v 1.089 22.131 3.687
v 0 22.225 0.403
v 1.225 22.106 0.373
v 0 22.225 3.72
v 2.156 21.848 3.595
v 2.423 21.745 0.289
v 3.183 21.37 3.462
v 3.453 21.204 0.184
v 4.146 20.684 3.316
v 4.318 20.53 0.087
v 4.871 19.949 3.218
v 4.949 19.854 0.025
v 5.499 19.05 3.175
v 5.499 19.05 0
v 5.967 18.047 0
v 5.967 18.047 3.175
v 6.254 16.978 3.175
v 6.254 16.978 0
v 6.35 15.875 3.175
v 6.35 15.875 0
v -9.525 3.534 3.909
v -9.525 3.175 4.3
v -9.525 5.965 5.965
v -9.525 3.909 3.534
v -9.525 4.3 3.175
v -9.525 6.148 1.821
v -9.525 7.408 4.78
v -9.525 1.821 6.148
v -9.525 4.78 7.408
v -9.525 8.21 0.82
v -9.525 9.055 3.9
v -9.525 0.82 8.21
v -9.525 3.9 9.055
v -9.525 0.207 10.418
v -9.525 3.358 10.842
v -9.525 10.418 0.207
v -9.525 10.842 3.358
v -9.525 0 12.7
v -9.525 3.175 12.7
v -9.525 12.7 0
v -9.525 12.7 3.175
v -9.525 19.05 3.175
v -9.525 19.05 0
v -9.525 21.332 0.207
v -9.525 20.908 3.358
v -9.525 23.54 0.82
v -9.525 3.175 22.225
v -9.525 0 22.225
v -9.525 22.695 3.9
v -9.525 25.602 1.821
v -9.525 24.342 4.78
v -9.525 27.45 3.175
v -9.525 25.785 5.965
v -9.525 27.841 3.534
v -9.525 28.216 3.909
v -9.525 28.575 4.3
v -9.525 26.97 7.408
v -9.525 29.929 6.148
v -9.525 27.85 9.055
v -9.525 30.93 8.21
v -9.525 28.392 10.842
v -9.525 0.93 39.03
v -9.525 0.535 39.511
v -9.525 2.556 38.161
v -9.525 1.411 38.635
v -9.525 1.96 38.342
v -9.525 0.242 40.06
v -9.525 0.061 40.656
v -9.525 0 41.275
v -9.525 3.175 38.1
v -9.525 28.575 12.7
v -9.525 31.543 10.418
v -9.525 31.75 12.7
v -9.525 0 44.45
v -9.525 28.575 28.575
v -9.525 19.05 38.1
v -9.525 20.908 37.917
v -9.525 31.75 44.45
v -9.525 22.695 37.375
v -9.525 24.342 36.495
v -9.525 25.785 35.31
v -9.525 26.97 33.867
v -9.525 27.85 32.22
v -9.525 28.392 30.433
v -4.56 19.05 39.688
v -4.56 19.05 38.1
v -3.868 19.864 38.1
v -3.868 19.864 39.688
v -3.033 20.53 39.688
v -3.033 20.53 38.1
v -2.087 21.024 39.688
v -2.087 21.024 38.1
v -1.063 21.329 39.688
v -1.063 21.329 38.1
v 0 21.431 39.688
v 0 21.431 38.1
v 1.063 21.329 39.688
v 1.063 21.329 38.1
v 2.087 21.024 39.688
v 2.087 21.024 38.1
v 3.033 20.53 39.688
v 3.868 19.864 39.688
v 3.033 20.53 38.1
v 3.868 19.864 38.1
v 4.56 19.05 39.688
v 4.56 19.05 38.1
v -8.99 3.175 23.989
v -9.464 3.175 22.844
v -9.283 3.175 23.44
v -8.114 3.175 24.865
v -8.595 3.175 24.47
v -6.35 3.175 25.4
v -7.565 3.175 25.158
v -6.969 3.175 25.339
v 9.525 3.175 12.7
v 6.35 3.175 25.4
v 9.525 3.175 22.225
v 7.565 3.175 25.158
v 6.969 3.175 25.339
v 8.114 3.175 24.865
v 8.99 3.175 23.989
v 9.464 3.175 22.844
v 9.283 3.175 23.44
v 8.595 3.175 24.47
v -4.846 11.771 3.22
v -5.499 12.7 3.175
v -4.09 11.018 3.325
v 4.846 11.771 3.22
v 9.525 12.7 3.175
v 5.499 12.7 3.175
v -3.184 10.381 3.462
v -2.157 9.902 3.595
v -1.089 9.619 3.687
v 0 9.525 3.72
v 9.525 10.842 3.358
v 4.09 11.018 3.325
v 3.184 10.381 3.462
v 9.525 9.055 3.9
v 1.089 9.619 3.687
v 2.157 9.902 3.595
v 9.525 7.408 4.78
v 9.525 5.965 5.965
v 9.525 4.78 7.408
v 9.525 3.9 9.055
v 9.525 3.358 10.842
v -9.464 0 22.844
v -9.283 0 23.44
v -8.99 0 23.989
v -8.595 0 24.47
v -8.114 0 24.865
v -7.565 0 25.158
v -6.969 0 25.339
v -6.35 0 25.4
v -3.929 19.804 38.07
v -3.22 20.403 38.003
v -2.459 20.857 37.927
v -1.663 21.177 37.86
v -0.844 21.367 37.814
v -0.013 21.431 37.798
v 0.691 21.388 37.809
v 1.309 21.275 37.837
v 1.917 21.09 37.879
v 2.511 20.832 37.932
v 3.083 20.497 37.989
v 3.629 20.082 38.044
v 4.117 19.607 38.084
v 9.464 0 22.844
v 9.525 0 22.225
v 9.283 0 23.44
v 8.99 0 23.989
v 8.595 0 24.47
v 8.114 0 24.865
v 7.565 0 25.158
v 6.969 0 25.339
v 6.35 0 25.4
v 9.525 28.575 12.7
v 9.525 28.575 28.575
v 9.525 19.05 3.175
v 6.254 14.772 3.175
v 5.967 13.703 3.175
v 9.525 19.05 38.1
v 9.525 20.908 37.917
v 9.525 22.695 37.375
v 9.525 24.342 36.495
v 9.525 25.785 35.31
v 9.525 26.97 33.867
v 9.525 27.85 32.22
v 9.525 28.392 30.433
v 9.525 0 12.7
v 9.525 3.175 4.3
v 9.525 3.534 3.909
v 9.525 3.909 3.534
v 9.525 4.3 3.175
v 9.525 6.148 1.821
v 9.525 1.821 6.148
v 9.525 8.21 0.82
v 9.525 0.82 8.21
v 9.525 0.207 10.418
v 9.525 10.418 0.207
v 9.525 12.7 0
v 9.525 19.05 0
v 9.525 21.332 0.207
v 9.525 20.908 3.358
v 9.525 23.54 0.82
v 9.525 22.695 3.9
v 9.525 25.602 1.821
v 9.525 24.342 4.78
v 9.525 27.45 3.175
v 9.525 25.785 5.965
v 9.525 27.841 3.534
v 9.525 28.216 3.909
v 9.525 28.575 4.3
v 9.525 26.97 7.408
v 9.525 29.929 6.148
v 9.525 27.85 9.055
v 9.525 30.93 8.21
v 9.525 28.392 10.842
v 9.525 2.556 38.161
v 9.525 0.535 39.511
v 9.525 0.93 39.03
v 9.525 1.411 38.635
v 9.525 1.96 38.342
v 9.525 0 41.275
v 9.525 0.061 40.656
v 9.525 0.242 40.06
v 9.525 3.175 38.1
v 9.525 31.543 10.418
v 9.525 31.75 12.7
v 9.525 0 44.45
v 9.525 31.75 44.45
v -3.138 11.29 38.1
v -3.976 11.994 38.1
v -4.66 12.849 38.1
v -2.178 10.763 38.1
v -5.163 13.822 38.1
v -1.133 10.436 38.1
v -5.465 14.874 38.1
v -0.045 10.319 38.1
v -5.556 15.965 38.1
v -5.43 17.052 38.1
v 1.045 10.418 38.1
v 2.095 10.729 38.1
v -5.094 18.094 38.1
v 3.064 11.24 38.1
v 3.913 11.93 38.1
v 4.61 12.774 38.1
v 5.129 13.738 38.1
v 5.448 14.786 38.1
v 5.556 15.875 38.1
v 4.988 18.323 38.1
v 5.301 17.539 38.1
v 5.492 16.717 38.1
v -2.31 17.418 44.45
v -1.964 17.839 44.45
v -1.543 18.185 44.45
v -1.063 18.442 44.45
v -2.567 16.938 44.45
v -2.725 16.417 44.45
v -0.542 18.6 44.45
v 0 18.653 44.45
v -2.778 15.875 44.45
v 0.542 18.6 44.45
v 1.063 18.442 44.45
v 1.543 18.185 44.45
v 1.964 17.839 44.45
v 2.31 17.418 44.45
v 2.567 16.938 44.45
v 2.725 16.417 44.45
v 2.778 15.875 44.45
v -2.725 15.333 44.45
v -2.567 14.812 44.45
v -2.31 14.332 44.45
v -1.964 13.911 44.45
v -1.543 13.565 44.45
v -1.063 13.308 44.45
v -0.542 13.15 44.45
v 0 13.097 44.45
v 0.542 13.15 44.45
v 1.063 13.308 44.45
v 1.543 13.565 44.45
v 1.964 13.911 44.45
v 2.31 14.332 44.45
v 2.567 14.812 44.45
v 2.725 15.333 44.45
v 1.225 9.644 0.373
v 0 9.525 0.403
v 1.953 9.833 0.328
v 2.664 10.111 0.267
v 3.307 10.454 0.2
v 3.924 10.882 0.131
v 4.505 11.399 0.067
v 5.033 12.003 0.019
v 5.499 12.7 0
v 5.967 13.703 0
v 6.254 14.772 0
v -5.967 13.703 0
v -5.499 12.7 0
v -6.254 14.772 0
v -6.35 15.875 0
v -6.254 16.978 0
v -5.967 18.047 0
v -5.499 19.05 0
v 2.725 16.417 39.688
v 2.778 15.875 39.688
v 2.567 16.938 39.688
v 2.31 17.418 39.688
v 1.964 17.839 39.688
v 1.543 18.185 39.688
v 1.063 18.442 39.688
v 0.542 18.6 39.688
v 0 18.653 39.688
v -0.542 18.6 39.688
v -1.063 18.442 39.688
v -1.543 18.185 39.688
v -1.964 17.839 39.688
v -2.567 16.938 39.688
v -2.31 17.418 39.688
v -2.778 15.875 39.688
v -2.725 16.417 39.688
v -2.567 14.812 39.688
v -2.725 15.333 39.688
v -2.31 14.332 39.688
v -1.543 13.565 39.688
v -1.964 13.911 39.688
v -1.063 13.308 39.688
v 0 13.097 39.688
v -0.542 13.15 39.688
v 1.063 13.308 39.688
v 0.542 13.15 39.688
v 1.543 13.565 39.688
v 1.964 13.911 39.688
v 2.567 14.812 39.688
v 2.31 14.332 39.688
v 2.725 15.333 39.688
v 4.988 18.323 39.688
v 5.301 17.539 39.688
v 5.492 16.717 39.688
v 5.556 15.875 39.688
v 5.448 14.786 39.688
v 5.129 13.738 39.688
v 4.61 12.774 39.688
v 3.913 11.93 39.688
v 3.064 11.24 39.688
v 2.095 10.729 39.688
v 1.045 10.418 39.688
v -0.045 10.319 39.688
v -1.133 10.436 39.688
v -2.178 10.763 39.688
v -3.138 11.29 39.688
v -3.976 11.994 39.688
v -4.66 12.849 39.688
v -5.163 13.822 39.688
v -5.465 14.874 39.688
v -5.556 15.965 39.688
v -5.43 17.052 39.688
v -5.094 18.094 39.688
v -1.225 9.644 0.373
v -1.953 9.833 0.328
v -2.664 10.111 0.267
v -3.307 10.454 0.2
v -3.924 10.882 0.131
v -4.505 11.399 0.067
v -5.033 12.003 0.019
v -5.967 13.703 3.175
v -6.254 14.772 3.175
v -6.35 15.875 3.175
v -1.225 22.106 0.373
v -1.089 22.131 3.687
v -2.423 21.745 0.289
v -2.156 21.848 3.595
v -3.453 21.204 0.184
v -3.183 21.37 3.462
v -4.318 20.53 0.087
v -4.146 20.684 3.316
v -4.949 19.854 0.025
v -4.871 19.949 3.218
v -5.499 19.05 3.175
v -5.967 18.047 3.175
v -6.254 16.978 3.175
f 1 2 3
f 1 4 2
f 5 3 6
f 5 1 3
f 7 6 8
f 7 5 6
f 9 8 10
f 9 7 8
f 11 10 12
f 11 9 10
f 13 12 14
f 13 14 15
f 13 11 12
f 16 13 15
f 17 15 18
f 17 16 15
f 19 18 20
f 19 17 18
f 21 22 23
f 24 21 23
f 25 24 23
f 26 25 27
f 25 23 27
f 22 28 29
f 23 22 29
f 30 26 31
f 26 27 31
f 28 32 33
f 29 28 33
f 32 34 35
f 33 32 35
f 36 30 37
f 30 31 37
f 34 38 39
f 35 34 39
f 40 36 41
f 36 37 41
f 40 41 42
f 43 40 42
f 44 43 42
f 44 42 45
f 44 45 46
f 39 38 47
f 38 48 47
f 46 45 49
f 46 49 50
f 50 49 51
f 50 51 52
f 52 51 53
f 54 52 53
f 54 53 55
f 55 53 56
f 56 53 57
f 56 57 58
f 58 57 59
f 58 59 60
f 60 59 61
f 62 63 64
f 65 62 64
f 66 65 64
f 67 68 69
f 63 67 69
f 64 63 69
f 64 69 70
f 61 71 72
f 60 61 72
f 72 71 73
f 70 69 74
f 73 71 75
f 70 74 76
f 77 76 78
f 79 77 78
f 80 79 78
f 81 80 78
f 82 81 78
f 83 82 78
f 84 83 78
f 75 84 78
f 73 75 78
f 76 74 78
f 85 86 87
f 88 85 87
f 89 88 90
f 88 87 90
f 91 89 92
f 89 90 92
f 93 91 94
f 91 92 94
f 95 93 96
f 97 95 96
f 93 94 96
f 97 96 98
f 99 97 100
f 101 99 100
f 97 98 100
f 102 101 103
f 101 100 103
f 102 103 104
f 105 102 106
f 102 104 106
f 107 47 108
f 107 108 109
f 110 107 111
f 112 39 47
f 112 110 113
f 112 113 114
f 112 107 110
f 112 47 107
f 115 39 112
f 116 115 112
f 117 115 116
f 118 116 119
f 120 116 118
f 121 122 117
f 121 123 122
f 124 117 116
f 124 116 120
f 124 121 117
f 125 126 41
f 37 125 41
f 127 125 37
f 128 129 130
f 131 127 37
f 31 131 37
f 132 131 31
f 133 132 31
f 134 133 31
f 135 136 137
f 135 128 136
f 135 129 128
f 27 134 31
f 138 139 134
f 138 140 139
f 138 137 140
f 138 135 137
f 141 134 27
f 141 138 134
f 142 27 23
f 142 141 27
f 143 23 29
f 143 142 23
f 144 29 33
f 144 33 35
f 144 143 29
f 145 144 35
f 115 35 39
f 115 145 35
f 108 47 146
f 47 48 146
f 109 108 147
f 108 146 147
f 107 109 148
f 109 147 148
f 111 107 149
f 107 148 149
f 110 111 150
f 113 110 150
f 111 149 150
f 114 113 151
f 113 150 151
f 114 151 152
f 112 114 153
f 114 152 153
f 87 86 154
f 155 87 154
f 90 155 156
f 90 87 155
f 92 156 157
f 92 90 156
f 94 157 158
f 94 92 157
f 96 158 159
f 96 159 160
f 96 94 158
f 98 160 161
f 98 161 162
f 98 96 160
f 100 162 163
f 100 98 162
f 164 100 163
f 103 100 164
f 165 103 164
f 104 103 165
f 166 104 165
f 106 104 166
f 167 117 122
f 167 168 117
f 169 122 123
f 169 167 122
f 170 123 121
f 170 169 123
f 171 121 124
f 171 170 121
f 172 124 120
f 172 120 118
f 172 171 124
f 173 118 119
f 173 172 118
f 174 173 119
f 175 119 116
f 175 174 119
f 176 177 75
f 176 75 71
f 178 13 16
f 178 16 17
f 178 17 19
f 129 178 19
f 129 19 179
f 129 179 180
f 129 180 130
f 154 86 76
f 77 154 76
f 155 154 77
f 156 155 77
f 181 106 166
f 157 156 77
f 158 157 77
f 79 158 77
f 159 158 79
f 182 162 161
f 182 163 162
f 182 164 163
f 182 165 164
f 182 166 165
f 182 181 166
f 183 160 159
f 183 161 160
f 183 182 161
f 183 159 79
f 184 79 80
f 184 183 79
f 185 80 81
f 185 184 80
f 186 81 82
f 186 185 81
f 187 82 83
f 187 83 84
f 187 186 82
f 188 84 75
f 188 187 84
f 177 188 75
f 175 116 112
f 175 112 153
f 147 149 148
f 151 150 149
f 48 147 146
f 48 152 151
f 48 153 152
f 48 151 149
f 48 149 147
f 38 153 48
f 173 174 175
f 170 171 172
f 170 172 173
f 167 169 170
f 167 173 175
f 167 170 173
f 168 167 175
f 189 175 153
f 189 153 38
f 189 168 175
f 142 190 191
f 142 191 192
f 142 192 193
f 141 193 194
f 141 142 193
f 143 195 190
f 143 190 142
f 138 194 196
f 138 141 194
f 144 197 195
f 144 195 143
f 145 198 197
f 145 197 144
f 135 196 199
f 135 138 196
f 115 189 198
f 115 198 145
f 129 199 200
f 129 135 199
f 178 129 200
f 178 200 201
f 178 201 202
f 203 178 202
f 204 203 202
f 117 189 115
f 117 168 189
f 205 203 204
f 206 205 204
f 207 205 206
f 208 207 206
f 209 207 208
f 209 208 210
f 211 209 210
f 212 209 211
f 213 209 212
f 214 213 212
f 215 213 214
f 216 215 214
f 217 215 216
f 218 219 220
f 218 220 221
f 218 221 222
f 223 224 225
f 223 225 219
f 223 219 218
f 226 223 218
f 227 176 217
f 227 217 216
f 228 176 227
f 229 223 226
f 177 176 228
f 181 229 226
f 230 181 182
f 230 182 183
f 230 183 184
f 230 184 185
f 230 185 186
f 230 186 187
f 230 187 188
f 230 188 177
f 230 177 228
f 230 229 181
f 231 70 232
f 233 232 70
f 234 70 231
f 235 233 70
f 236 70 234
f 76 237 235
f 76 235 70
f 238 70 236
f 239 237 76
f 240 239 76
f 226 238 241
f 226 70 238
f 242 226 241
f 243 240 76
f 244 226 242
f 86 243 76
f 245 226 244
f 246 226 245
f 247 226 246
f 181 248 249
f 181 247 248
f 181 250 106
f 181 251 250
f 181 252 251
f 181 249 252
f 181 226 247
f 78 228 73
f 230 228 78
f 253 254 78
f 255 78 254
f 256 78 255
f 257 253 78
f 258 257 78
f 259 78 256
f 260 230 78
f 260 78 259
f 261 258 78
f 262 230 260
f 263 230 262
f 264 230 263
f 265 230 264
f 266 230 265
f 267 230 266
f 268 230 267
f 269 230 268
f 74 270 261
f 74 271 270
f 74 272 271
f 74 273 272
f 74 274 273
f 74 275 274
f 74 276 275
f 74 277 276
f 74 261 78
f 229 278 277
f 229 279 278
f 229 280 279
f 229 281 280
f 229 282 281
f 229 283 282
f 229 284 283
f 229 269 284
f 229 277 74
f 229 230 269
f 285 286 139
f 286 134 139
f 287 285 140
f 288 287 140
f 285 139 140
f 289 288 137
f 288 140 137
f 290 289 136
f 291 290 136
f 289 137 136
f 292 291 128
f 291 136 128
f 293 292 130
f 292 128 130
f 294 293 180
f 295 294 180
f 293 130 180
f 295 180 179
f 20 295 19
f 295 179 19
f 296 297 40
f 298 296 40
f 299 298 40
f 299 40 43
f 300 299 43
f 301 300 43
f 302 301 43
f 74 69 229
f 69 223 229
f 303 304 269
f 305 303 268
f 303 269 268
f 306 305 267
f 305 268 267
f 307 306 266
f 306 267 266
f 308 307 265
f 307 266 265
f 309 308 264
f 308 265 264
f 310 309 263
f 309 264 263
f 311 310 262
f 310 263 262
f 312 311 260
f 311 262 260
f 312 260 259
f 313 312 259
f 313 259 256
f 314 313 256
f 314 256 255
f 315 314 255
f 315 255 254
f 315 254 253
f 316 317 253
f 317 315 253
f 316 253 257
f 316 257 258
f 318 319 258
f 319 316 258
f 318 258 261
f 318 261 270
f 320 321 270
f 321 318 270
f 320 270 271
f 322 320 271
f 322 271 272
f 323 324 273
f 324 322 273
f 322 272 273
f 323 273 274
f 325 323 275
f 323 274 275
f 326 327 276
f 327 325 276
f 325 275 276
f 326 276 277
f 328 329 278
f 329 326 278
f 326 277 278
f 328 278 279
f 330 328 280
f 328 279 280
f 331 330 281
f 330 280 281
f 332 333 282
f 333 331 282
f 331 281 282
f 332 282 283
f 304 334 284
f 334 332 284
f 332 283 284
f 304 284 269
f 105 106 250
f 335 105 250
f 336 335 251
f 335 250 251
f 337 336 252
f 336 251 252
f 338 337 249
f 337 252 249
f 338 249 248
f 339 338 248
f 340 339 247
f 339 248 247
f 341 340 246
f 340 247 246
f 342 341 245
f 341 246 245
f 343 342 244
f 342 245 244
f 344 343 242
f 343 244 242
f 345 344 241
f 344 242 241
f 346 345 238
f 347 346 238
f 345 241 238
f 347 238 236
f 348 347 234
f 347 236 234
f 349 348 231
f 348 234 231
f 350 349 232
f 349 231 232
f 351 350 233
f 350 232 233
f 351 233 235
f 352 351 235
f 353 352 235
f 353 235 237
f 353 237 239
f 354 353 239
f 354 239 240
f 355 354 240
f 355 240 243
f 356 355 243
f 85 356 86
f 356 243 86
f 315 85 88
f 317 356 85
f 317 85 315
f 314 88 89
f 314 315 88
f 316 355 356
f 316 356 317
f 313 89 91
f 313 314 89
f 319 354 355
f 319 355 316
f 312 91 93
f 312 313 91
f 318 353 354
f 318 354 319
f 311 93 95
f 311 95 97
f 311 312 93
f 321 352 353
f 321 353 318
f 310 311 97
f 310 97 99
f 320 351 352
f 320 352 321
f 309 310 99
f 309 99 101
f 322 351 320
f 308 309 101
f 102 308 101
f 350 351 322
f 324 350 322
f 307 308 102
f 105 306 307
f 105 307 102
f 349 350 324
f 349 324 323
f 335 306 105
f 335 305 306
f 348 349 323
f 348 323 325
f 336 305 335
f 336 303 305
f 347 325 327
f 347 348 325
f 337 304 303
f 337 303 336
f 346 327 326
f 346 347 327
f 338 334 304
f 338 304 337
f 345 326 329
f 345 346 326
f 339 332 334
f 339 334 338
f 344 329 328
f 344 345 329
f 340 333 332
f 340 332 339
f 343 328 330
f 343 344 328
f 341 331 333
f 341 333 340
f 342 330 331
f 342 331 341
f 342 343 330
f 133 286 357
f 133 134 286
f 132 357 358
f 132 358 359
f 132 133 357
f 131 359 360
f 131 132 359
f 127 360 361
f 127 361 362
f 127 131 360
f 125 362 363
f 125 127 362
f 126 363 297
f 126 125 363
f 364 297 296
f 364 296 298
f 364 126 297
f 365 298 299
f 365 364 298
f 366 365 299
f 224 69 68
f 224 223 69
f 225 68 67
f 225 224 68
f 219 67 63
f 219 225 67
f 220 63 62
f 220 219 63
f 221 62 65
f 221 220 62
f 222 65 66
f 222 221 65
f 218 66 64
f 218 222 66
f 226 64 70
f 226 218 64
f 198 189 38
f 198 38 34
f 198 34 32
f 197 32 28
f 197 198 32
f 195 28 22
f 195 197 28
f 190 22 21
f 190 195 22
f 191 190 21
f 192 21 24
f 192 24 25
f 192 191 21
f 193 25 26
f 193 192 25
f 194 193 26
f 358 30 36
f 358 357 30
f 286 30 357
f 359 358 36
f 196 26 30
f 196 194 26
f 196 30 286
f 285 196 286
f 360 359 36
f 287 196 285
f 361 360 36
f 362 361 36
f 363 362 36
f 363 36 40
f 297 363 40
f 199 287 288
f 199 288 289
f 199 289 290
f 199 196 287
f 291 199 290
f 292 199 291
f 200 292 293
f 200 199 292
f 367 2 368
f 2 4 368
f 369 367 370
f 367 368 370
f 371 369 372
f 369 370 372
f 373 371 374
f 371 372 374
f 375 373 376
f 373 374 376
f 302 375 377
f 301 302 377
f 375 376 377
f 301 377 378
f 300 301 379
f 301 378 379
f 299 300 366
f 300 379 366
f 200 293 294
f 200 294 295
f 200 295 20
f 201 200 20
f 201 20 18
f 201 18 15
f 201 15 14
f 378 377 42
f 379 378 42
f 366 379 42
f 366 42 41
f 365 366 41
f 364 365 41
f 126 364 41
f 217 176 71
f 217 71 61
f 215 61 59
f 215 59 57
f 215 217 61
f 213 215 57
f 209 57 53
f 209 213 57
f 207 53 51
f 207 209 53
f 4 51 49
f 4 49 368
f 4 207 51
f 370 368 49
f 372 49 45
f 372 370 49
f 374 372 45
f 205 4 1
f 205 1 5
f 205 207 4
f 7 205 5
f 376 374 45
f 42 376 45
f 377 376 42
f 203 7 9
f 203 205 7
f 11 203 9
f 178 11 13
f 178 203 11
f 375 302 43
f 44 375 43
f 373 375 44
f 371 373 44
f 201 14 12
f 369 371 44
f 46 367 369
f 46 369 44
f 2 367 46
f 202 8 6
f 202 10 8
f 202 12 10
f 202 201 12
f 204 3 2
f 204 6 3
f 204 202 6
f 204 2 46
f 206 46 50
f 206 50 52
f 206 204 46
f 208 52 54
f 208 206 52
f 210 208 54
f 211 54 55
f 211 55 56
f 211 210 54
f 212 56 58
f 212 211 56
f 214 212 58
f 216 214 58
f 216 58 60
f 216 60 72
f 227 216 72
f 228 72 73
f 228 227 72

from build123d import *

# Parameters (mm, degrees)
F0_W     = 3.175
F0_H     = 6.35
F1_DEPTH = 9.525
F2_W     = 12.7
F2_H     = 6.35
F2_H_2   = 3.175
F3_DEPTH = 3.7207438789
F4_R     = 6.34999
F5_R     = 3.175
F6_R     = 2.778125
F7_DEPTH = 6.35
F8_R     = 2.778125
F9_DEPTH = 1.5875


# Not quite as in the source:
# - a fillet or chamfer is up to 0.001 mm smaller than in the source, because OpenCascade refuses the exact size
# - a feature names something its author has since deleted; it is built from what else it names


with BuildPart() as f1:
    # F0 (on Right) → F1 (new body, symmetric)
    with BuildSketch(Plane.YZ):
        with BuildLine():
            Line((31.75, 44.45), (3.175, 44.45))
            Line((3.175, 44.45), (3.175, 38.1))
            Line((3.175, 38.1), (19.05, 38.1))
            Line((19.05, 38.1), (28.575, 38.1))
            Line((28.575, 38.1), (28.575, 28.575))
            Line((28.575, 28.575), (28.575, 12.7))
            Line((28.575, 12.7), (28.575, 4.2997395874))
            ThreePointArc((28.575, 4.2997395874), (30.929762203, 8.2098719395), (31.75, 12.7))
            Line((31.75, 12.7), (31.75, 44.45))
        make_face()
        with Locations((1.5875, 41.275)):
            Rectangle(F0_W, F0_H)
        with BuildLine():
            Line((28.575, 38.1), (19.05, 38.1))
            ThreePointArc((19.05, 38.1), (25.7851920908, 35.3101920908), (28.575, 28.575))
            Line((28.575, 28.575), (28.575, 38.1))
        make_face()
        with BuildLine():
            ThreePointArc((27.4502604126, 3.175), (28.0302561211, 3.7197438789), (28.575, 4.2997395874))
            Line((28.575, 4.2997395874), (28.575, 12.7))
            ThreePointArc((28.575, 12.7), (25.7851920908, 5.9648079092), (19.05, 3.175))
            Line((19.05, 3.175), (27.4502604126, 3.175))
        make_face()
        with BuildLine():
            ThreePointArc((19.05, 0), (23.5401280605, 0.820237797), (27.4502604126, 3.175))
            Line((27.4502604126, 3.175), (19.05, 3.175))
            Line((19.05, 3.175), (12.7, 3.175))
            Line((12.7, 3.175), (4.2997395874, 3.175))
            ThreePointArc((4.2997395874, 3.175), (8.2098719395, 0.820237797), (12.7, 0))
            Line((12.7, 0), (19.05, 0))
        make_face()
        with BuildLine():
            ThreePointArc((12.7, 3.175), (5.9648079092, 5.9648079092), (3.175, 12.7))
            Line((3.175, 12.7), (3.175, 4.2997395874))
            ThreePointArc((3.175, 4.2997395874), (3.7197438789, 3.7197438789), (4.2997395874, 3.175))
            Line((4.2997395874, 3.175), (12.7, 3.175))
        make_face()
        with BuildLine():
            Line((3.175, 25.4), (0, 25.4))
            Line((0, 25.4), (0, 12.7))
            ThreePointArc((0, 12.7), (0.820237797, 8.2098719395), (3.175, 4.2997395874))
            Line((3.175, 4.2997395874), (3.175, 12.7))
            Line((3.175, 12.7), (3.175, 25.4))
        make_face()
    extrude(amount=F1_DEPTH, both=True)

    # F2 (on face) → F3 (cut, through all)
    with BuildSketch(Plane(origin=(0, 0, 0), x_dir=(1, 0, 0), z_dir=(0, 0, -1))):
        with Locations((0, -15.875)):
            Rectangle(F2_W, F2_H)
        with Locations((0, -11.1125)):
            Rectangle(F2_W, F2_H_2)
        with Locations((0, -20.6375)):
            Rectangle(F2_W, F2_H_2)
    extrude(amount=-F3_DEPTH, mode=Mode.SUBTRACT)

    # F4 (radius 6.35 in the source; OpenCascade refuses exactly that, so slightly less here)
    f4_edges = [f1.edges().sort_by_distance(p)[0] for p in [
        (-6.35, 22.225, 2.061511),
        (-6.35, 9.525, 2.061511),
        (6.35, 9.525, 2.061511),
        (6.35, 22.225, 2.061511),
    ]]
    fillet(f4_edges, radius=F4_R)

    # F5
    f5_edges = [f1.edges().sort_by_distance(p)[0] for p in [
        (0, 0, 38.1),
        (9.525, 1.5875, 25.4),
        (-9.525, 1.5875, 25.4),
    ]]
    fillet(f5_edges, radius=F5_R)

    # F6 (on face) → F7 (cut, through all)
    with BuildSketch(Plane.XY.offset(44.45)):
        with Locations((0, 15.875)):
            Circle(F6_R)
    extrude(amount=-F7_DEPTH, mode=Mode.SUBTRACT)

    # F8 (on face) → F9 (cut, symmetric)
    with BuildSketch(Plane(origin=(0, 0, 38.1), x_dir=(1, 0, 0), z_dir=(0, 0, -1))):
        with BuildLine():
            ThreePointArc((4.5597466007, -19.05), (5.3012737202, -17.5388542623), (5.55625, -15.875))
            ThreePointArc((5.55625, -15.875), (-1.6638542623, -10.5737262798), (-4.5597466007, -19.05))
            Line((-4.5597466007, -19.05), (4.5597466007, -19.05))
        make_face()
        with Locations((0, -15.875)):
            Circle(F8_R, mode=Mode.SUBTRACT)
        with BuildLine():
            Line((4.5597466007, -19.05), (-4.5597466007, -19.05))
            ThreePointArc((-4.5597466007, -19.05), (0, -21.43125), (4.5597466007, -19.05))
        make_face()
    extrude(amount=F9_DEPTH, both=True, mode=Mode.SUBTRACT)


solid = f1.part
